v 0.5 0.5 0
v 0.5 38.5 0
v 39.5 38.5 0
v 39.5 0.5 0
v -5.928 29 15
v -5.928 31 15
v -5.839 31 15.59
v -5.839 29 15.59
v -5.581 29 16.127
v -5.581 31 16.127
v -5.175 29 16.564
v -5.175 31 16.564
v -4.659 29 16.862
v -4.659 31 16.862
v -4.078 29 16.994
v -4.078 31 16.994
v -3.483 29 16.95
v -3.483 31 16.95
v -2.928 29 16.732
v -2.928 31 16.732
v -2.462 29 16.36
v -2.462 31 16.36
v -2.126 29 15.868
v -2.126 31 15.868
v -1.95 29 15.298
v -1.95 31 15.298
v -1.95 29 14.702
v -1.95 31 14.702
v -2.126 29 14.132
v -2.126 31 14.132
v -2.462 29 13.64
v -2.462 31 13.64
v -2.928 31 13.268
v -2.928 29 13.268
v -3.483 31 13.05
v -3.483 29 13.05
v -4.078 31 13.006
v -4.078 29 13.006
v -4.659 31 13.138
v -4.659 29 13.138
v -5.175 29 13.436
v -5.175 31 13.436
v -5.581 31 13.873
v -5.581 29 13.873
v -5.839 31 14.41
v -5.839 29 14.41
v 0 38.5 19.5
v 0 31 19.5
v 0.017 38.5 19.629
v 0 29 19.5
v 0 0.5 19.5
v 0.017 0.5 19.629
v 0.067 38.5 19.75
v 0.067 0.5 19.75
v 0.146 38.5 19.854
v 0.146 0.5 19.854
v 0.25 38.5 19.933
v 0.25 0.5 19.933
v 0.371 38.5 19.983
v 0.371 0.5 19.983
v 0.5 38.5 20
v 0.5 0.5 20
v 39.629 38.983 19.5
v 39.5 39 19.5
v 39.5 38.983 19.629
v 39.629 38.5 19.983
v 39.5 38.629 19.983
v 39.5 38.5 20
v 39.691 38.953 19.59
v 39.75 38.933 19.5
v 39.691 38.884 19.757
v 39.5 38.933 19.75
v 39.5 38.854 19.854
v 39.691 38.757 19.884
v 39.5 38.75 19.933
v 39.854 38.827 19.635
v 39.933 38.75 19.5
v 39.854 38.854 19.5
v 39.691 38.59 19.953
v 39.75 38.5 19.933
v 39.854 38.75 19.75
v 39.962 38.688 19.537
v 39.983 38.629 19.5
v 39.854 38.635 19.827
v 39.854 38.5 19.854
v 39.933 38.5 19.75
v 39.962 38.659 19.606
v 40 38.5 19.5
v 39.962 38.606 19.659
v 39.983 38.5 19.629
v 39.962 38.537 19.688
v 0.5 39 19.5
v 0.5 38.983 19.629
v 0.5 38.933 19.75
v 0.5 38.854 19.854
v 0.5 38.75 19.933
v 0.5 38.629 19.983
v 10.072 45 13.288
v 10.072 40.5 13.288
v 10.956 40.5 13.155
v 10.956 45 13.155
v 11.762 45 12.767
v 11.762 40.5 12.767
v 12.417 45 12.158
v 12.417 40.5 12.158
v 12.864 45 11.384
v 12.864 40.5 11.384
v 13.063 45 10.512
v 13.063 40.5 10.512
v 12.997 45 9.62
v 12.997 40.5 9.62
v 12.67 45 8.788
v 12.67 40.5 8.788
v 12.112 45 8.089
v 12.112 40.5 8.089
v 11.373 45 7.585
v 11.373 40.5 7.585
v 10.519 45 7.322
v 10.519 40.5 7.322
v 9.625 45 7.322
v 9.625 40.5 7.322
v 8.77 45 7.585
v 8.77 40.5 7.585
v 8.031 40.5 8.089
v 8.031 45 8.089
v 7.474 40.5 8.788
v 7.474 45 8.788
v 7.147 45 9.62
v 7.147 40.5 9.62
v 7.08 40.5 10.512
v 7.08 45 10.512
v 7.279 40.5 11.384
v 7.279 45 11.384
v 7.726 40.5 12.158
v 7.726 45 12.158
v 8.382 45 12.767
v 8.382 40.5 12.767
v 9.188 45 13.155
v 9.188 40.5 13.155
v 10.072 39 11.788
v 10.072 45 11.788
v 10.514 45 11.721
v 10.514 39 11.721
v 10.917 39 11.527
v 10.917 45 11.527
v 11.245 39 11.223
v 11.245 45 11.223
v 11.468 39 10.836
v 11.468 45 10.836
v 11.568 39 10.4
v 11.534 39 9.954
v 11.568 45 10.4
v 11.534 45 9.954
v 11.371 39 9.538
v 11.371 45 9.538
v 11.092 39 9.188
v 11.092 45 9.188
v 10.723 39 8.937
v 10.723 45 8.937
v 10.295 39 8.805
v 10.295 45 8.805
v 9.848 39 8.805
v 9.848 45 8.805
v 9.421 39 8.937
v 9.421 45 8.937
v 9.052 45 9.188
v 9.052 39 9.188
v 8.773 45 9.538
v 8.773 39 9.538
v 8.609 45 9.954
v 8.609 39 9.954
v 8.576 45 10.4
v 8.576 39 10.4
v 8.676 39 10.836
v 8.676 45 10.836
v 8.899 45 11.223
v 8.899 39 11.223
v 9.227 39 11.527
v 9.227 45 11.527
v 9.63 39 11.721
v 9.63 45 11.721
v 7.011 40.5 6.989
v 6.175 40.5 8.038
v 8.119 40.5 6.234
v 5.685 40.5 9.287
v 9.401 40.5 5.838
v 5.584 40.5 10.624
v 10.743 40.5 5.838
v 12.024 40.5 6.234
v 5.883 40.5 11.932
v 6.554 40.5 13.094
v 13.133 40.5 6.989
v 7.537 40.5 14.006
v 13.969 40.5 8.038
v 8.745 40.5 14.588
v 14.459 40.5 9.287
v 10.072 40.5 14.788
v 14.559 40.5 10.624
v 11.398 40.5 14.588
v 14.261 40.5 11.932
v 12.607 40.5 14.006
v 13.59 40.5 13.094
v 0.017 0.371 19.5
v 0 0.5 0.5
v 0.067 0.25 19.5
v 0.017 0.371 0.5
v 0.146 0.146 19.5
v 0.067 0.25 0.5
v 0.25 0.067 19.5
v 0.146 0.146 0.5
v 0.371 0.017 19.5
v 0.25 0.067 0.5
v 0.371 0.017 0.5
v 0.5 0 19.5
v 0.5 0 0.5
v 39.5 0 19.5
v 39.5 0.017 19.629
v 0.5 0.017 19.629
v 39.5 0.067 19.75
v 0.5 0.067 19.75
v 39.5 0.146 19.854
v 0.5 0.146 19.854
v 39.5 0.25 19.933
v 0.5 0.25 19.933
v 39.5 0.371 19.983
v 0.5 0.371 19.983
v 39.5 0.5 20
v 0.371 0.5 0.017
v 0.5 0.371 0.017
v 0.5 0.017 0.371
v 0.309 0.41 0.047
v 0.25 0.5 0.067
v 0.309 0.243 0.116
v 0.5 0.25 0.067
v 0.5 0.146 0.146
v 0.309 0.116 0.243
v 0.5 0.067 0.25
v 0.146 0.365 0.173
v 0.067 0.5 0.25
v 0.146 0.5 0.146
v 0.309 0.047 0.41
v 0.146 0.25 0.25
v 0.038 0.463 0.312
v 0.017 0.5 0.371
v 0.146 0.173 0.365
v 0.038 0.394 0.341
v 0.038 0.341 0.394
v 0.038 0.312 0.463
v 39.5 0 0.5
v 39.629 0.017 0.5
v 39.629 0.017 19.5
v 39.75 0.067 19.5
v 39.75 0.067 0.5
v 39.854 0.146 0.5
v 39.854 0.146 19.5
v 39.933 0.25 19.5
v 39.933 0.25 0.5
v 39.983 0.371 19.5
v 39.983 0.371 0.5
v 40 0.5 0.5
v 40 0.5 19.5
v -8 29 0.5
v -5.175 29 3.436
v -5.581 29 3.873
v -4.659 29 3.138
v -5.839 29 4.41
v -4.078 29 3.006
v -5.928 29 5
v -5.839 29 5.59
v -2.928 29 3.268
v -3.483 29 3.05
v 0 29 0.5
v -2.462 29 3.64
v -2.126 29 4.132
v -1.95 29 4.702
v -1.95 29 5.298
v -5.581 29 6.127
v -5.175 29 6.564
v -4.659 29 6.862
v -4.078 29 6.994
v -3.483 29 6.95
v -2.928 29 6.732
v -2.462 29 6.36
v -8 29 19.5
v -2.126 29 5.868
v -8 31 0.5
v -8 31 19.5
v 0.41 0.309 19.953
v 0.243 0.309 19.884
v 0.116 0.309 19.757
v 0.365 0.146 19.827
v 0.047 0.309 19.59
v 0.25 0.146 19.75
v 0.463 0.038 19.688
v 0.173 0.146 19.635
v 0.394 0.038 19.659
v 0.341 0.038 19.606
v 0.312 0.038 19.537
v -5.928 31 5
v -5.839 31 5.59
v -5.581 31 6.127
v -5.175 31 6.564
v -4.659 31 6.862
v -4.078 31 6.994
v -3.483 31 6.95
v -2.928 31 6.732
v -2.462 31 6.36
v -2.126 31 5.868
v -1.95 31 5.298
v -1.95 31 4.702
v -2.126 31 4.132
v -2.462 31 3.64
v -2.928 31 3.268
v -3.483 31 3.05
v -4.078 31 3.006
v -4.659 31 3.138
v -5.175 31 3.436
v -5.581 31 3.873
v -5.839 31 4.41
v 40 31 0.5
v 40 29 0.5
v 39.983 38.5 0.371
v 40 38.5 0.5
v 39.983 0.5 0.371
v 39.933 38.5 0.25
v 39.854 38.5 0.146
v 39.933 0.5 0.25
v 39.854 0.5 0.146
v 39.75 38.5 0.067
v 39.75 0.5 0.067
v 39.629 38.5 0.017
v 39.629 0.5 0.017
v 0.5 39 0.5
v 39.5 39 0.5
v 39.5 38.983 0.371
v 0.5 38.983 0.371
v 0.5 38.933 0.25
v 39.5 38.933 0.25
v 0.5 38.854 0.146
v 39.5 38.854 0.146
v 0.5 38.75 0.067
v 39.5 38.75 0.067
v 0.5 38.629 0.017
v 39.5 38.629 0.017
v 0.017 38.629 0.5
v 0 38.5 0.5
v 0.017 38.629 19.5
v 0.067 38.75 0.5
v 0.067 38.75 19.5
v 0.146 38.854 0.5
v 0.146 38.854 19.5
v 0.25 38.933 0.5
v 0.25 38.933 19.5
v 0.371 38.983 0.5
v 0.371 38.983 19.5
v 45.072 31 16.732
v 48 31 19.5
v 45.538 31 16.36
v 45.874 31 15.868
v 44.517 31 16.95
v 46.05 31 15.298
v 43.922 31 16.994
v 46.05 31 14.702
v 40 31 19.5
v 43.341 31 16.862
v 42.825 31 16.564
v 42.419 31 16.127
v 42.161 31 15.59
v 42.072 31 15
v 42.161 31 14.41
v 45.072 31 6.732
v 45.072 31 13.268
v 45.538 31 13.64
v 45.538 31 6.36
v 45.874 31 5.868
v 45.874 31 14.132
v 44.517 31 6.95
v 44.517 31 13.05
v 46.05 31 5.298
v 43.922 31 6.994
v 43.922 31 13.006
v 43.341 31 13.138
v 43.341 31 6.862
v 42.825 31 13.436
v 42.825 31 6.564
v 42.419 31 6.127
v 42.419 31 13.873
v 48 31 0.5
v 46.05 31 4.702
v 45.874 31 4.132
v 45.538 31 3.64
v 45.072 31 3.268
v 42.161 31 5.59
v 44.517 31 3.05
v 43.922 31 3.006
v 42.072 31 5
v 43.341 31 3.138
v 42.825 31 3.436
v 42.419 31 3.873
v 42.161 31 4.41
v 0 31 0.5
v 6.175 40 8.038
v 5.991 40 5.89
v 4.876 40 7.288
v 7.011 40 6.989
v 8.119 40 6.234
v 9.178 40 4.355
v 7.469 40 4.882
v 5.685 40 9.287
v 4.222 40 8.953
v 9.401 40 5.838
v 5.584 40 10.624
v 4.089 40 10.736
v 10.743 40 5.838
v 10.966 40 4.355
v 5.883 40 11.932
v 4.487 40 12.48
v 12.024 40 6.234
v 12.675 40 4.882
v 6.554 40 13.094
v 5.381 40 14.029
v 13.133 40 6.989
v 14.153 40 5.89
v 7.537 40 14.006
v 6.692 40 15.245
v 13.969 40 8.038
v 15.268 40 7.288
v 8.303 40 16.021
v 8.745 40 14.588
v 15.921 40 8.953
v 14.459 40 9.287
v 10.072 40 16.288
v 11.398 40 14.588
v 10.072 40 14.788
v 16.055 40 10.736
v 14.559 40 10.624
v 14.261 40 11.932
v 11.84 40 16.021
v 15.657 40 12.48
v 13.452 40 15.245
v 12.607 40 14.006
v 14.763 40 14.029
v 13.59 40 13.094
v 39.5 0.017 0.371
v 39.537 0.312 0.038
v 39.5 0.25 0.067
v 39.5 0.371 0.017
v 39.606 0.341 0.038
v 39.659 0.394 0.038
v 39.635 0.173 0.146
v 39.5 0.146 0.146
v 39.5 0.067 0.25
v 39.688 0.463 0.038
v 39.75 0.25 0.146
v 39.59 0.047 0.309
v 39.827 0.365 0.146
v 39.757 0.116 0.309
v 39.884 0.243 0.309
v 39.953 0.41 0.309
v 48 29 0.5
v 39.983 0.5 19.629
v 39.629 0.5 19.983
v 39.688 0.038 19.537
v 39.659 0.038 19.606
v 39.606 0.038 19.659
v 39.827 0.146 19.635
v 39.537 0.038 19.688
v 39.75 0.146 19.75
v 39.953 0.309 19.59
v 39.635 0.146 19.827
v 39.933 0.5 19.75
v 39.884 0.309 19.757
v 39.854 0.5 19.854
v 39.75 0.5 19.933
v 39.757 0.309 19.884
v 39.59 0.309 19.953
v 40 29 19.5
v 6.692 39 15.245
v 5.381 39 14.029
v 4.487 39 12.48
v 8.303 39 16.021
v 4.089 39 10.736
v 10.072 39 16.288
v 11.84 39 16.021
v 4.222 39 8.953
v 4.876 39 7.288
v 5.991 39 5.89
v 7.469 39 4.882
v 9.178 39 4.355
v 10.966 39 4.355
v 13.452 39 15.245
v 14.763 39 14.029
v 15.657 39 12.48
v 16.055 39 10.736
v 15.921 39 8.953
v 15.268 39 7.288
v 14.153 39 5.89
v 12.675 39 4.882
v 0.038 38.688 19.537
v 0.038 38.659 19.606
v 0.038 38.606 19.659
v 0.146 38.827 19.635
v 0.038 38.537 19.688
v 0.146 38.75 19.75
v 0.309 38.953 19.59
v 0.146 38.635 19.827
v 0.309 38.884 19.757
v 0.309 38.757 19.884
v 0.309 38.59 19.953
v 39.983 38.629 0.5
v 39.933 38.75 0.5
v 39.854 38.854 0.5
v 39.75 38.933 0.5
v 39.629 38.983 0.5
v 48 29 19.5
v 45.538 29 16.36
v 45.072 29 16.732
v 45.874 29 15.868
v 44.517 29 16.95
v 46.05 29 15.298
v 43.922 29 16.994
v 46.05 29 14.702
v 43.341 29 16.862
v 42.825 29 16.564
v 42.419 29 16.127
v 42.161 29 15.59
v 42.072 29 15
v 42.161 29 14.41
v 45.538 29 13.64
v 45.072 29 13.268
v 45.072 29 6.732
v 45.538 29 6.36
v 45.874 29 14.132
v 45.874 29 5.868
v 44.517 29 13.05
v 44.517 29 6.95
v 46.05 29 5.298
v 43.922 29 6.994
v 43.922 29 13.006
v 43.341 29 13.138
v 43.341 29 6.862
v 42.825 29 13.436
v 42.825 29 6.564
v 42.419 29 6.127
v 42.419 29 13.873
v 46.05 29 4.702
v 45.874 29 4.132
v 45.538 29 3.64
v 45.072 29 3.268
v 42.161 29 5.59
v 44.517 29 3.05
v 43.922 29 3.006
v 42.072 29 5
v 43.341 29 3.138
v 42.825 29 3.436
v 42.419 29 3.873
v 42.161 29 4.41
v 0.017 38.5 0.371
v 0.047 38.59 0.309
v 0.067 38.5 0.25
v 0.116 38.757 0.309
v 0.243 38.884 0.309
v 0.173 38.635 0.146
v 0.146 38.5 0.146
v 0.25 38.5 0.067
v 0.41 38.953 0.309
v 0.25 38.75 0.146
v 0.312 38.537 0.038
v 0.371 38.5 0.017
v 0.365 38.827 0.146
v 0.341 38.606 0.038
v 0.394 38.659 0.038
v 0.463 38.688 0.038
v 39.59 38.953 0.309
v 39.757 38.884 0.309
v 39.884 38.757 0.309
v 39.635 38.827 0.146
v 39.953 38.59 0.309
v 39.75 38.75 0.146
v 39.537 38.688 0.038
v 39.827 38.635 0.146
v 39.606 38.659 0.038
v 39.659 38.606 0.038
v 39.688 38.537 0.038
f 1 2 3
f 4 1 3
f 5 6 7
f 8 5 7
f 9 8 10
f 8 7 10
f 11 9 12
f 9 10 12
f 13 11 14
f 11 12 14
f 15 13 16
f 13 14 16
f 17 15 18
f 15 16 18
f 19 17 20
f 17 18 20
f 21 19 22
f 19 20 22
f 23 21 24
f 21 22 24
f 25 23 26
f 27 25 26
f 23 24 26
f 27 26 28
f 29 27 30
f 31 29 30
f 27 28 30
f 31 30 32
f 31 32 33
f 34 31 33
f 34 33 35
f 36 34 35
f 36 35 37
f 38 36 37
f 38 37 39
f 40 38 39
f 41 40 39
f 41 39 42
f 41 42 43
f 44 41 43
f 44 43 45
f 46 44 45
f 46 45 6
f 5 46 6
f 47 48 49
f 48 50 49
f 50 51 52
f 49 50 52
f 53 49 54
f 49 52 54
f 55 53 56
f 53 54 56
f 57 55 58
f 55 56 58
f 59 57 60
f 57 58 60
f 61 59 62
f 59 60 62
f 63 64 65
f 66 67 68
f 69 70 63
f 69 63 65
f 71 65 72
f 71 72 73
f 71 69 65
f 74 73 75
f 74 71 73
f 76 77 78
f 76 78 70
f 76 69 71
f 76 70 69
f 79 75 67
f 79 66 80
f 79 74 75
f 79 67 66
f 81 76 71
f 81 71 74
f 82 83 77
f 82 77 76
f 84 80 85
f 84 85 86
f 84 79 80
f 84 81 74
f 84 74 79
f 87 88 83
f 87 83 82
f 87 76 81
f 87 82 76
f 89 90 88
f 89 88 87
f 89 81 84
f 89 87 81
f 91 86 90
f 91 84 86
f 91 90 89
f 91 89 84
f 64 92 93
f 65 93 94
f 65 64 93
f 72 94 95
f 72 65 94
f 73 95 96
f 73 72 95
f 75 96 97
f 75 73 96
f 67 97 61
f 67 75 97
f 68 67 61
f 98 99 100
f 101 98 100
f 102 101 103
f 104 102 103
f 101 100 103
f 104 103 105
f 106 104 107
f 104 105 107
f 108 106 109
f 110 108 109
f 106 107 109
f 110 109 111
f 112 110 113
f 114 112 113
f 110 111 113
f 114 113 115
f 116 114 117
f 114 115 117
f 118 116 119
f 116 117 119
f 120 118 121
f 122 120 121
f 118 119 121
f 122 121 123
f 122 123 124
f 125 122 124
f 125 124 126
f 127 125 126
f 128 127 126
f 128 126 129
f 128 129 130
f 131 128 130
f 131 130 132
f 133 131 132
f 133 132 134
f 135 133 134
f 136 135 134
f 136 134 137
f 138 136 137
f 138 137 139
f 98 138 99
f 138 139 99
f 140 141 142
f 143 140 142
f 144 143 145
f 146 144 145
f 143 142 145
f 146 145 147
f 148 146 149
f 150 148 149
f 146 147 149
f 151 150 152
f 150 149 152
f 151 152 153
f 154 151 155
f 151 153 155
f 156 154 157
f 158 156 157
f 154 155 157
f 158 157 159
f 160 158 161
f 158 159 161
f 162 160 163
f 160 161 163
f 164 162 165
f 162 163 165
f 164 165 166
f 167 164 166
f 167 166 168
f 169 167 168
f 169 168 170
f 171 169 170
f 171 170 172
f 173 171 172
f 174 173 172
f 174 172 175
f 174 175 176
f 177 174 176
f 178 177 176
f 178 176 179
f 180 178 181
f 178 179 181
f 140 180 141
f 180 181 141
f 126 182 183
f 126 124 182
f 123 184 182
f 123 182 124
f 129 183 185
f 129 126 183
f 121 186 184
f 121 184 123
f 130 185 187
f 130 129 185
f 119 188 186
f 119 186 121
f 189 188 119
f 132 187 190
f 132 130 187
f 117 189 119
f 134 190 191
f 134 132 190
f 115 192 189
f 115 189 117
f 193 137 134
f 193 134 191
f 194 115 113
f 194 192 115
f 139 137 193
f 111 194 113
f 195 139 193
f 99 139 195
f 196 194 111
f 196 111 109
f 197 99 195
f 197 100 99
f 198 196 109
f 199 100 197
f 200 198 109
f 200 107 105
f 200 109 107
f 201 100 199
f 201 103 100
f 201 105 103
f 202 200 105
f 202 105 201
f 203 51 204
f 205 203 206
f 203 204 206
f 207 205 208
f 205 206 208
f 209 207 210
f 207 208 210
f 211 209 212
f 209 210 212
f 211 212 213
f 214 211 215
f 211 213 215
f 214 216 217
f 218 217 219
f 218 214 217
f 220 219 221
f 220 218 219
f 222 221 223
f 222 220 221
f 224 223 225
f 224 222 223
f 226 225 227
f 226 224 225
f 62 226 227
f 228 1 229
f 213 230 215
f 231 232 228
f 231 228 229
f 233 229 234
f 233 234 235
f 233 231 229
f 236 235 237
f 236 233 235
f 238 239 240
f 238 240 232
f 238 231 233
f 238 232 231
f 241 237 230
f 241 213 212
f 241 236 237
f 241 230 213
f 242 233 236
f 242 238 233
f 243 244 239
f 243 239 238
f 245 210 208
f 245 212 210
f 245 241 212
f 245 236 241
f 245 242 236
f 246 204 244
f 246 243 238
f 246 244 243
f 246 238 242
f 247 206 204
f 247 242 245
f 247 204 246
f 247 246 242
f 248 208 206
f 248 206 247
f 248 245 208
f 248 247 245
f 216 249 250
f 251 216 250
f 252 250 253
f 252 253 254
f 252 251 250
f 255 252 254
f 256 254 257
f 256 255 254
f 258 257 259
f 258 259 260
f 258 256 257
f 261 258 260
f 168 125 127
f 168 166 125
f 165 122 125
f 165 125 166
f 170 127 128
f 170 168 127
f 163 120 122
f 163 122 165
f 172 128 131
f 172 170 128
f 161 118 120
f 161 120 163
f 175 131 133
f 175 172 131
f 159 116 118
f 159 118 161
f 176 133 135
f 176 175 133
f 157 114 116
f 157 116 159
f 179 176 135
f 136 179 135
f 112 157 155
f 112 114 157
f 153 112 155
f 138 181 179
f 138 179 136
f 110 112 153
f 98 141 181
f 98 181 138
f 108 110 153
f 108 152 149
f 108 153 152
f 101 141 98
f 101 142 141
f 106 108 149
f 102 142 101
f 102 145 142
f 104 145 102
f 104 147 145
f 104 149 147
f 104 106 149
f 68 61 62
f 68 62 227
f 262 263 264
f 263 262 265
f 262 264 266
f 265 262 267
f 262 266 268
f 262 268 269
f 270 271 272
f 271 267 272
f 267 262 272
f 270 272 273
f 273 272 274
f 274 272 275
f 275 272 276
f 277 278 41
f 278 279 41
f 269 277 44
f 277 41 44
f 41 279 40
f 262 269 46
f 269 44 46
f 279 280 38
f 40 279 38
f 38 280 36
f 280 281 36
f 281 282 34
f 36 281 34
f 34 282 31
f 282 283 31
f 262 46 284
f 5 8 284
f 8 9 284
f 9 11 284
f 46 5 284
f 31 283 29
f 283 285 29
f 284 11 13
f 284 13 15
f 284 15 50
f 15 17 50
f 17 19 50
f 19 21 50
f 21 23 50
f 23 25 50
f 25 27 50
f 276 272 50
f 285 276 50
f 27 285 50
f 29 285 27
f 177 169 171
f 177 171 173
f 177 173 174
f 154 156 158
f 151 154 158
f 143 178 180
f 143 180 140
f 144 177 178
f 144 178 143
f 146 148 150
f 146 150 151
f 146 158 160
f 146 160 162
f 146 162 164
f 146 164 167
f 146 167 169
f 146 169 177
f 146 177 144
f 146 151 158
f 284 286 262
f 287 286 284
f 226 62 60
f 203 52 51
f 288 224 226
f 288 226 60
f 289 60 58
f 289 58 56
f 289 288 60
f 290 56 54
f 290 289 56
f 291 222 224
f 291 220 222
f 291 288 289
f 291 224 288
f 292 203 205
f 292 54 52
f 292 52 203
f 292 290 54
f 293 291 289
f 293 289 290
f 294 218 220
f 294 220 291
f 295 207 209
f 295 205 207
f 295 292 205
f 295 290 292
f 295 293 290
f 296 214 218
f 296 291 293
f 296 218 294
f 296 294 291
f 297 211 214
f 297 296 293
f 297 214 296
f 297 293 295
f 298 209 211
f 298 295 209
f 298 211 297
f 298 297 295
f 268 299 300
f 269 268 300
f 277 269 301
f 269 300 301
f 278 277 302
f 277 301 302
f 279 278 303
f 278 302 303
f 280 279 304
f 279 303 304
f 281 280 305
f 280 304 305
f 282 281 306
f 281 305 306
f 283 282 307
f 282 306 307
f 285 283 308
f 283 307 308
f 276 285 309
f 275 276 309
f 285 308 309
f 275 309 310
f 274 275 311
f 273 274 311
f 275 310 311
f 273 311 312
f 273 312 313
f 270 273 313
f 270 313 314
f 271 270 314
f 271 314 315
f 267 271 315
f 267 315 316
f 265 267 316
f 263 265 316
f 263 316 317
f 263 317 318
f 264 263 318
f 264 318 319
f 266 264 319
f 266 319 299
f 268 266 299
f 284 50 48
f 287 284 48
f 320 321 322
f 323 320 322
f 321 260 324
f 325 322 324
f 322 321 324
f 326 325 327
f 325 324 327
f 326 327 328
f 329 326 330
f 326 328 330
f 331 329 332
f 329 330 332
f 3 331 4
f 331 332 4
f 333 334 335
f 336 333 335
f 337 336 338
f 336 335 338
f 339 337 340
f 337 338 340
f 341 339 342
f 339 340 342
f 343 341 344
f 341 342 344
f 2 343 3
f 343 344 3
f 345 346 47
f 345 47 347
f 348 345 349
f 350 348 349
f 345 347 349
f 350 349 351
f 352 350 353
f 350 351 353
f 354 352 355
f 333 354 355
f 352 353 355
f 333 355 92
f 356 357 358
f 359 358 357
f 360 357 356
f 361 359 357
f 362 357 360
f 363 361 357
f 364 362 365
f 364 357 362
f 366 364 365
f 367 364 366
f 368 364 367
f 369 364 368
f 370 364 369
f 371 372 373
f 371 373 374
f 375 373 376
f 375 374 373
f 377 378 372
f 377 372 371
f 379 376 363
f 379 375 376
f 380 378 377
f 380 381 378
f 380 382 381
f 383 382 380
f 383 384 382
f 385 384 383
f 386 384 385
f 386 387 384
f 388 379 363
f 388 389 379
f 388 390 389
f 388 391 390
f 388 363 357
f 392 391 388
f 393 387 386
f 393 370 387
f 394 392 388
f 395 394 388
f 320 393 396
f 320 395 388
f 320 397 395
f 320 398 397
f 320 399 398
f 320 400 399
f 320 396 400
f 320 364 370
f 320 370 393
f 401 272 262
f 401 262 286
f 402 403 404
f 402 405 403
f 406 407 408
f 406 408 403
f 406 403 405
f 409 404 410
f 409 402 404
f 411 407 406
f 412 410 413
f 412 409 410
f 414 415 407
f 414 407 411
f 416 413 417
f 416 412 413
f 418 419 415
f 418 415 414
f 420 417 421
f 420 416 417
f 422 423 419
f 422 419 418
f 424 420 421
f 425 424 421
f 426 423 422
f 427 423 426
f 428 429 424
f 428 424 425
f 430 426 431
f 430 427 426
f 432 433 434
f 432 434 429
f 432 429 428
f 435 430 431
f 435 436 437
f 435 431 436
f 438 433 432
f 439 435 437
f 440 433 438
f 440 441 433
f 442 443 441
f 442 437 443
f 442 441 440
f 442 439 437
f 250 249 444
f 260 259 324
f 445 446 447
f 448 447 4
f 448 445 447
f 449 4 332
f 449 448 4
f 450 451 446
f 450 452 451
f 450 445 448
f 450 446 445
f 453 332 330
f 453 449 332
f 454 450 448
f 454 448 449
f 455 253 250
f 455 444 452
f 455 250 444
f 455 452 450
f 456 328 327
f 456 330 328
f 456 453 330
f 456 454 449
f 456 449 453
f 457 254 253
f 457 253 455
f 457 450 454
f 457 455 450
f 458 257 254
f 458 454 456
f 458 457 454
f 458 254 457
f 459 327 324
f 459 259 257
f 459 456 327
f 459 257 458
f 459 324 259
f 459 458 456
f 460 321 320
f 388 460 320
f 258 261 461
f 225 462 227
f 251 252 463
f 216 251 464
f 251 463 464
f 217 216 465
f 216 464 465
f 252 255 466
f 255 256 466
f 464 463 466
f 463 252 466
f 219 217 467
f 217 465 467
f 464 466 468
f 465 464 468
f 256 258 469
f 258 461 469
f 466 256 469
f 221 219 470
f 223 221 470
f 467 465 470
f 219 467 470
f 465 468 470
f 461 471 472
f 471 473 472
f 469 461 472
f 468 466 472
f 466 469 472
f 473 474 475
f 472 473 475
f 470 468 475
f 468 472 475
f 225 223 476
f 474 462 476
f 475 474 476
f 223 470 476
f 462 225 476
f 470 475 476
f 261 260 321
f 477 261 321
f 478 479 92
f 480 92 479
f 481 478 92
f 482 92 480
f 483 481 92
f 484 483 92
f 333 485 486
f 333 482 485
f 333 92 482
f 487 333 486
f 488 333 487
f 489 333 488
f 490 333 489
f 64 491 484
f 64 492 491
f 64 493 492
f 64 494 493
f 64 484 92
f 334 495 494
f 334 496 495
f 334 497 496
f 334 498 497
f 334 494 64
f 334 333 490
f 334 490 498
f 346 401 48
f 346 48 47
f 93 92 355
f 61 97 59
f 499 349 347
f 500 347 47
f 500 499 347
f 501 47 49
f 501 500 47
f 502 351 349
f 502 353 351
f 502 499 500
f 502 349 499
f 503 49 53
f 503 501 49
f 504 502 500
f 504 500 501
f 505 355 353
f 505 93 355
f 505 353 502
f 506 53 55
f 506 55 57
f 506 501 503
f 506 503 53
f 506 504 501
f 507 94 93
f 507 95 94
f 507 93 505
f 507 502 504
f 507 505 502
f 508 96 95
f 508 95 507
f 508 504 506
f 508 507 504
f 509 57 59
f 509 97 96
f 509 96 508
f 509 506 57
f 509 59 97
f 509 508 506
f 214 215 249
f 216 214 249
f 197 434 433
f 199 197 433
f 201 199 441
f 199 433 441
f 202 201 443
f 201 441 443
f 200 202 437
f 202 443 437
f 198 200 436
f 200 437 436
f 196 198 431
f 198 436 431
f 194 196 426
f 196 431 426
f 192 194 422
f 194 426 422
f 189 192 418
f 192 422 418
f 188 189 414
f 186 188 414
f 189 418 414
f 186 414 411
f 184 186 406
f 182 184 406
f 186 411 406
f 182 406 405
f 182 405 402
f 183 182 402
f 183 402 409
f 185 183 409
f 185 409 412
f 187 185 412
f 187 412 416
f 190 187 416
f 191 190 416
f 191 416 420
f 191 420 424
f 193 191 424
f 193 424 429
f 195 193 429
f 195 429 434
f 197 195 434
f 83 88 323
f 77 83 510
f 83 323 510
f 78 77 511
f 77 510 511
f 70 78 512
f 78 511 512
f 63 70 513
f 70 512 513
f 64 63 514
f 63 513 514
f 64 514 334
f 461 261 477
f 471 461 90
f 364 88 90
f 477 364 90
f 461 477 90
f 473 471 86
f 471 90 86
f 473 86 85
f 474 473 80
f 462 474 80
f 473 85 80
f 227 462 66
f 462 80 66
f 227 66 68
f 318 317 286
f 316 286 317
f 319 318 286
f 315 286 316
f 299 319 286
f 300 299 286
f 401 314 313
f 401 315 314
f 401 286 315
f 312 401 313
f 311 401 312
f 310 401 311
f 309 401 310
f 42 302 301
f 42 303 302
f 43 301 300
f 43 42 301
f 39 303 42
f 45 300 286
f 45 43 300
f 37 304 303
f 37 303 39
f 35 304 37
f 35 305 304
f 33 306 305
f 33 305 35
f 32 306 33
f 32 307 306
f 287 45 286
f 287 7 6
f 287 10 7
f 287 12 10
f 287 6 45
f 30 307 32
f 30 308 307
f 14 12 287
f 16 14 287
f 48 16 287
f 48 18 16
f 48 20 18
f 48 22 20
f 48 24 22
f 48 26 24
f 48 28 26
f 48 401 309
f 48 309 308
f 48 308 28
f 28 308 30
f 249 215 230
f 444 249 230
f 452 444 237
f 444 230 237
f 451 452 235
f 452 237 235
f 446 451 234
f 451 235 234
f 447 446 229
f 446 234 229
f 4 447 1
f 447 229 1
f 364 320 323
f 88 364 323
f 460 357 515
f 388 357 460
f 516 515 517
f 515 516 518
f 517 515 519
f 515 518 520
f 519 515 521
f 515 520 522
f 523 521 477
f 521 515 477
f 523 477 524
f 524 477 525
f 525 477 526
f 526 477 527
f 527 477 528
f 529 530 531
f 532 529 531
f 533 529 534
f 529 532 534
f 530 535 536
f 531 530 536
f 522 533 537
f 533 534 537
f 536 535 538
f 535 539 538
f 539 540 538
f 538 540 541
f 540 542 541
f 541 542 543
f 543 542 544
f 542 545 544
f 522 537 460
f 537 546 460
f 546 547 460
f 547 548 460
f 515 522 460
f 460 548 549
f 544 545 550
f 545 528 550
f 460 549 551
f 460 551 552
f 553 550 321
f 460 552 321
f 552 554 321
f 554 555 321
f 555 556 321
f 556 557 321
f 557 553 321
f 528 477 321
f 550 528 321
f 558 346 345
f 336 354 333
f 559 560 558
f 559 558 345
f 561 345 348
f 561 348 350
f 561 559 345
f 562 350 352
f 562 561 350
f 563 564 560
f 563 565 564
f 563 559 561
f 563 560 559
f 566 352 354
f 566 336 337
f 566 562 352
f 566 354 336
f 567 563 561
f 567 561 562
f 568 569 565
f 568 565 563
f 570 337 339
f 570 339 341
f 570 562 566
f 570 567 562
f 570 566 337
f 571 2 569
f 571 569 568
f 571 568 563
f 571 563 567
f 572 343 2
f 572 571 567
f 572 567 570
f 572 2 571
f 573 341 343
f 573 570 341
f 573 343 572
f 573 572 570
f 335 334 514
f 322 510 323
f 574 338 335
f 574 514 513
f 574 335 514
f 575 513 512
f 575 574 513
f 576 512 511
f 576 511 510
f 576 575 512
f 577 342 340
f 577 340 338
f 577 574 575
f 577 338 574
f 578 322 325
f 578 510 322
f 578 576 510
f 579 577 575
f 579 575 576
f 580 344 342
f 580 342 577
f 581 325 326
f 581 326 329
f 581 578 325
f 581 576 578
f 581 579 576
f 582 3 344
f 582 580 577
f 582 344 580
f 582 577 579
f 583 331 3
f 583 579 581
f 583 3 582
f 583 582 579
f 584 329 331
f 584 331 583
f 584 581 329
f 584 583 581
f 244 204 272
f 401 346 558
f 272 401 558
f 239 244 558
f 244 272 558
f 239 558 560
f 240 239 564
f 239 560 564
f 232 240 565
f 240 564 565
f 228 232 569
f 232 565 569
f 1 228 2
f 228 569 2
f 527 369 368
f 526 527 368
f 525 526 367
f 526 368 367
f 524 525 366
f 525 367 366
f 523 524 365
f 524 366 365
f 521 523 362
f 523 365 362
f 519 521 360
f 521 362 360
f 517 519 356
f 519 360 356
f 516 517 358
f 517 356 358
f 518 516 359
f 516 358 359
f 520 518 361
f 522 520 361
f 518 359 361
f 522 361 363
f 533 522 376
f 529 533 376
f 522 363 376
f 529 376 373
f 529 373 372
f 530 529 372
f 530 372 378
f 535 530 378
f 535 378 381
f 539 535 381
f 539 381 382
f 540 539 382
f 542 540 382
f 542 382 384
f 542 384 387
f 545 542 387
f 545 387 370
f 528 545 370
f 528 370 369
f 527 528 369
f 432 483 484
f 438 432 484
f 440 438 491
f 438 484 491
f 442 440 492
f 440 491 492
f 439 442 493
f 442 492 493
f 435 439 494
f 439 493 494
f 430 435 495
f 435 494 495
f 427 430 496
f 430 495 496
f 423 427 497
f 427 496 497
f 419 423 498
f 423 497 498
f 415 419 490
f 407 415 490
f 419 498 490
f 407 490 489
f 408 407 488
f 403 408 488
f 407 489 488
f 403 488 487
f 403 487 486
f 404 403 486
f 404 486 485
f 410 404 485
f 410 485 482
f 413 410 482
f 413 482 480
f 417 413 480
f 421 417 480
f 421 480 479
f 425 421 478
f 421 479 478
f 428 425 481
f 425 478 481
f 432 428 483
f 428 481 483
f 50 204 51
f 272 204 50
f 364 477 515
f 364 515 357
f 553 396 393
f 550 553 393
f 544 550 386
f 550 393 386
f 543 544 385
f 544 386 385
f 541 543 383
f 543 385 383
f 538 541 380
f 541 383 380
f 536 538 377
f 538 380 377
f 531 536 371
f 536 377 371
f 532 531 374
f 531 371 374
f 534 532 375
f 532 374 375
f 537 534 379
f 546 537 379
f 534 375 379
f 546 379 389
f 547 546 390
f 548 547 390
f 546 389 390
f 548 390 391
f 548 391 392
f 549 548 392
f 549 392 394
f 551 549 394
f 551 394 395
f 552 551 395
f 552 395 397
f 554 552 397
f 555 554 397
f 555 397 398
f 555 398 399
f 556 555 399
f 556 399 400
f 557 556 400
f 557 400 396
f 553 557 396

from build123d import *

# Parameters (mm, degrees)
SKETCH_1_W          = 40
SKETCH_1_H          = 39
EXTRUDE_2_DEPTH     = 20
FILLET_2_R          = 0.5
FILLET_3_R          = 0.5
FILLET_4_R          = 0.5
FILLET_5_R          = 0.5
SKETCH_6_W          = 19
SKETCH_6_H          = 2
EXTRUDE_3_DEPTH     = 8
SKETCH_7_W          = 19
SKETCH_7_H          = 2
EXTRUDE_5_DEPTH     = 8
SKETCH_8_R          = 2
CUT_EXTRUDE_1_DEPTH = 28
SKETCH_9_R          = 6
SKETCH_9_R_2        = 4.5
EXTRUDE_7_DEPTH     = 1
SKETCH_10_R         = 4.5
EXTRUDE_8_DEPTH     = 1.5
SKETCH_11_R         = 3
EXTRUDE_9_DEPTH     = 4.5
SKETCH_12_R         = 1.5
CUT_EXTRUDE_2_DEPTH = 6


with BuildPart() as part:
    # 草图1 → 凸台-拉伸2 (new body)
    with BuildSketch(Plane.XY):
        with Locations((20, 19.5)):
            Rectangle(SKETCH_1_W, SKETCH_1_H)
    extrude(amount=EXTRUDE_2_DEPTH)

    # 圆角2
    fillet_2_edges = [part.edges().sort_by_distance(p)[0] for p in [
        (40, 19.5, 20),
        (20, 39, 20),
    ]]
    fillet(fillet_2_edges, radius=FILLET_2_R)

    # 圆角3
    fillet_3_edges = [part.edges().sort_by_distance(p)[0] for p in [
        (40, 0, 9.75),
        (19.75, 0, 20),
        (39.853553391, 0, 19.853553391),
        (0, 39, 9.75),
        (0, 38.853553391, 19.853553391),
        (0, 19.25, 20),
    ]]
    fillet(fillet_3_edges, radius=FILLET_3_R)

    # 圆角4
    # the kernel refuses this fillet: 0.5 mm, written as the material it takes off along each edge
    with BuildSketch(Plane(origin=(39.5, 38.5, 19.5), x_dir=(0, 1, 0), z_dir=(1, 0, 0))) as fillet_4_piece_1_section:
        Polygon((0, 0), (FILLET_4_R, 0), (FILLET_4_R, FILLET_4_R), (0, FILLET_4_R), align=None)
    fillet_4_piece_1 = extrude(amount=FILLET_4_R, mode=Mode.PRIVATE)
    fillet_4_piece_1 = fillet_4_piece_1 - Plane(origin=(39.5, 38.5, 19.5), x_dir=(0, -0.7071067811865475, -0.7071067811865475), z_dir=(1, 0, 0)) * Sphere(FILLET_4_R, mode=Mode.PRIVATE)
    add(fillet_4_piece_1, mode=Mode.SUBTRACT)
    with BuildSketch(Plane(origin=(40, 39, -1.25), x_dir=(0, -1, 0), z_dir=(0, 0, 1))) as fillet_4_piece_2:
        with BuildLine():
            CenterArc((FILLET_4_R, -FILLET_4_R), FILLET_4_R, 90, 90)
            Line((0, -FILLET_4_R), (0, 0))
            Line((0, 0), (FILLET_4_R, 0))
        make_face()
    extrude(amount=20.75, mode=Mode.SUBTRACT)
    with BuildSketch(Plane(origin=(40, 0.5, 0), x_dir=(-1, 0, 0), z_dir=(0, 1, 0))) as fillet_4_piece_3:
        with BuildLine():
            CenterArc((FILLET_4_R, FILLET_4_R), FILLET_4_R, 180, 90)
            Line((0, FILLET_4_R), (0, 0))
            Line((0, 0), (FILLET_4_R, 0))
        make_face()
    extrude(amount=39.75, mode=Mode.SUBTRACT)
    with BuildSketch(Plane(origin=(39.5, 0.5, 0), x_dir=(0, -1, 0), z_dir=(-1, 0, 0))) as fillet_4_piece_4:
        with BuildLine():
            CenterArc((0.5 - FILLET_4_R, FILLET_4_R), FILLET_4_R, 270, 90)
            Line((0.5, FILLET_4_R), (0.5, 0))
            Line((0.5, 0), (0.5 - FILLET_4_R, 0))
        make_face()
    revolve(axis=Axis((39.5, 0.5, 0), (0, 0, 1)), revolution_arc=90, mode=Mode.SUBTRACT)
    with BuildSketch(Plane(origin=(-1.25, 0, 0), x_dir=(0, 0, 1), z_dir=(1, 0, 0))) as fillet_4_piece_5:
        with BuildLine():
            CenterArc((FILLET_4_R, -FILLET_4_R), FILLET_4_R, 90, 90)
            Line((0, -FILLET_4_R), (0, 0))
            Line((0, 0), (FILLET_4_R, 0))
        make_face()
    extrude(amount=40.75, mode=Mode.SUBTRACT)

    # 圆角5
    # the kernel refuses this fillet: 0.5 mm, written as the material it takes off along each edge
    with BuildSketch(Plane(origin=(0.5, 0.5, 19.5), x_dir=(-1, 0, 0), z_dir=(0, -1, 0))) as fillet_5_piece_1_section:
        Polygon((0, 0), (FILLET_5_R, 0), (FILLET_5_R, -FILLET_5_R), (0, -FILLET_5_R), align=None)
    fillet_5_piece_1 = extrude(amount=FILLET_5_R, mode=Mode.PRIVATE)
    fillet_5_piece_1 = fillet_5_piece_1 - Plane(origin=(0.5, 0.5, 19.5), x_dir=(0.7071067811865475, 0, -0.7071067811865475), z_dir=(0, -1, 0)) * Sphere(FILLET_5_R, mode=Mode.PRIVATE)
    add(fillet_5_piece_1, mode=Mode.SUBTRACT)
    with BuildSketch(Plane(origin=(39.5, 38.5, 0.5), x_dir=(0, 1, 0), z_dir=(0, 0, -1))) as fillet_5_piece_2_section:
        Polygon((0, 0), (FILLET_5_R, 0), (FILLET_5_R, FILLET_5_R), (0, FILLET_5_R), align=None)
    fillet_5_piece_2 = extrude(amount=FILLET_5_R, mode=Mode.PRIVATE)
    fillet_5_piece_2 = fillet_5_piece_2 - Plane(origin=(39.5, 38.5, 0.5), x_dir=(-0.7071067811865475, -0.7071067811865477, 0), z_dir=(0, 0, -1)) * Sphere(FILLET_5_R, mode=Mode.PRIVATE)
    add(fillet_5_piece_2, mode=Mode.SUBTRACT)
    with BuildSketch(Plane(origin=(39.5, 39, 0), x_dir=(0, -1, 0), z_dir=(-1, 0, 0))) as fillet_5_piece_3:
        with BuildLine():
            CenterArc((FILLET_5_R, FILLET_5_R), FILLET_5_R, 180, 90)
            Line((0, FILLET_5_R), (0, 0))
            Line((0, 0), (FILLET_5_R, 0))
        make_face()
    extrude(amount=39, mode=Mode.SUBTRACT)
    with BuildSketch(Plane(origin=(0.5, 38.5, 0), x_dir=(-1, 0, 0), z_dir=(0, -1, 0))) as fillet_5_piece_4:
        with BuildLine():
            CenterArc((0.5 - FILLET_5_R, -FILLET_5_R), FILLET_5_R, 0, 90)
            Line((0.5, -FILLET_5_R), (0.5, 0))
            Line((0.5, 0), (0.5 - FILLET_5_R, 0))
        make_face()
    revolve(axis=Axis((0.5, 38.5, 0), (0, 0, -1)), revolution_arc=90, mode=Mode.SUBTRACT)
    with BuildSketch(Plane(origin=(0, 0, 0.5), x_dir=(1, 0, 0), z_dir=(0, 0, 1))) as fillet_5_piece_5:
        with BuildLine():
            CenterArc((FILLET_5_R, FILLET_5_R), FILLET_5_R, 180, 90)
            Line((0, FILLET_5_R), (0, 0))
            Line((0, 0), (FILLET_5_R, 0))
        make_face()
    extrude(amount=19, mode=Mode.SUBTRACT)
    with BuildSketch(Plane(origin=(0, 38.5, 0), x_dir=(0, 0, 1), z_dir=(0, -1, 0))) as fillet_5_piece_6:
        with BuildLine():
            CenterArc((FILLET_5_R, -FILLET_5_R), FILLET_5_R, 90, 90)
            Line((0, -FILLET_5_R), (0, 0))
            Line((0, 0), (FILLET_5_R, 0))
        make_face()
    extrude(amount=38, mode=Mode.SUBTRACT)
    with BuildSketch(Plane(origin=(0, 0.5, 0.5), x_dir=(0, 0, -1), z_dir=(0, 1, 0))) as fillet_5_piece_7:
        with BuildLine():
            CenterArc((0.5 - FILLET_5_R, -FILLET_5_R), FILLET_5_R, 0, 90)
            Line((0.5 - FILLET_5_R, 0), (0.5, 0))
            Line((0.5, 0), (0.5, -FILLET_5_R))
        make_face()
    revolve(axis=Axis((0, 0.5, 0.5), (-1, 0, 0)), revolution_arc=90, mode=Mode.SUBTRACT)

    # 草图6 → 凸台-拉伸3 (add)
    with BuildSketch(Plane.ZY):
        with Locations((10, 30)):
            Rectangle(SKETCH_6_W, SKETCH_6_H)
    extrude(amount=EXTRUDE_3_DEPTH)

    # 草图7 → 凸台-拉伸5 (add)
    with BuildSketch(Plane(origin=(40, 0, 0), x_dir=(0, 0, -1), z_dir=(1, 0, 0))):
        with Locations((-10, 30)):
            Rectangle(SKETCH_7_W, SKETCH_7_H)
    extrude(amount=EXTRUDE_5_DEPTH)

    # 草图8 → 切除-拉伸1 (cut)
    with BuildSketch(Plane(origin=(0, 39, 0), x_dir=(1, 0, 0), z_dir=(0, 1, 0))):
        with Locations(Location((-3.928154272, -5, 0), (0, 0, 180))):
            Circle(SKETCH_8_R)
        with Locations(Location((-3.928154272, -15, 0), (0, 0, 180))):
            Circle(SKETCH_8_R)
        with Locations(Location((44.071845728, -5, 0), (0, 0, 180))):
            Circle(SKETCH_8_R)
        with Locations(Location((44.071845728, -15, 0), (0, 0, 180))):
            Circle(SKETCH_8_R)
    extrude(amount=-CUT_EXTRUDE_1_DEPTH, mode=Mode.SUBTRACT)

    # 草图9 → 凸台-拉伸7 (add)
    with BuildSketch(Plane(origin=(0, 39, 0), x_dir=(1, 0, 0), z_dir=(0, 1, 0))):
        with Locations(Location((10.071845728, -10.288024079, 0), (0, 0, 270))):
            Circle(SKETCH_9_R)
        with Locations(Location((10.071845728, -10.288024079, 0), (0, 0, 270))):
            Circle(SKETCH_9_R_2, mode=Mode.SUBTRACT)
    extrude(amount=EXTRUDE_7_DEPTH)

    # 草图10 → 凸台-拉伸8 (add)
    with BuildSketch(Plane(origin=(0, 39, 0), x_dir=(1, 0, 0), z_dir=(0, 1, 0))):
        with Locations(Location((10.071845728, -10.288024079, 0), (0, 0, 270))):
            Circle(SKETCH_10_R)
    extrude(amount=EXTRUDE_8_DEPTH)

    # 草图11 → 凸台-拉伸9 (add)
    with BuildSketch(Plane(origin=(0, 40.5, 0), x_dir=(1, 0, 0), z_dir=(0, 1, 0))):
        with Locations(Location((10.071845728, -10.288024079, 0), (0, 0, 270))):
            Circle(SKETCH_11_R)
    extrude(amount=EXTRUDE_9_DEPTH)

    # 草图12 → 切除-拉伸2 (cut)
    with BuildSketch(Plane(origin=(0, 45, 0), x_dir=(1, 0, 0), z_dir=(0, 1, 0))):
        with Locations(Location((10.071845728, -10.288024079, 0), (0, 0, 270))):
            Circle(SKETCH_12_R)
    extrude(amount=-CUT_EXTRUDE_2_DEPTH, mode=Mode.SUBTRACT)


solid = part.part
